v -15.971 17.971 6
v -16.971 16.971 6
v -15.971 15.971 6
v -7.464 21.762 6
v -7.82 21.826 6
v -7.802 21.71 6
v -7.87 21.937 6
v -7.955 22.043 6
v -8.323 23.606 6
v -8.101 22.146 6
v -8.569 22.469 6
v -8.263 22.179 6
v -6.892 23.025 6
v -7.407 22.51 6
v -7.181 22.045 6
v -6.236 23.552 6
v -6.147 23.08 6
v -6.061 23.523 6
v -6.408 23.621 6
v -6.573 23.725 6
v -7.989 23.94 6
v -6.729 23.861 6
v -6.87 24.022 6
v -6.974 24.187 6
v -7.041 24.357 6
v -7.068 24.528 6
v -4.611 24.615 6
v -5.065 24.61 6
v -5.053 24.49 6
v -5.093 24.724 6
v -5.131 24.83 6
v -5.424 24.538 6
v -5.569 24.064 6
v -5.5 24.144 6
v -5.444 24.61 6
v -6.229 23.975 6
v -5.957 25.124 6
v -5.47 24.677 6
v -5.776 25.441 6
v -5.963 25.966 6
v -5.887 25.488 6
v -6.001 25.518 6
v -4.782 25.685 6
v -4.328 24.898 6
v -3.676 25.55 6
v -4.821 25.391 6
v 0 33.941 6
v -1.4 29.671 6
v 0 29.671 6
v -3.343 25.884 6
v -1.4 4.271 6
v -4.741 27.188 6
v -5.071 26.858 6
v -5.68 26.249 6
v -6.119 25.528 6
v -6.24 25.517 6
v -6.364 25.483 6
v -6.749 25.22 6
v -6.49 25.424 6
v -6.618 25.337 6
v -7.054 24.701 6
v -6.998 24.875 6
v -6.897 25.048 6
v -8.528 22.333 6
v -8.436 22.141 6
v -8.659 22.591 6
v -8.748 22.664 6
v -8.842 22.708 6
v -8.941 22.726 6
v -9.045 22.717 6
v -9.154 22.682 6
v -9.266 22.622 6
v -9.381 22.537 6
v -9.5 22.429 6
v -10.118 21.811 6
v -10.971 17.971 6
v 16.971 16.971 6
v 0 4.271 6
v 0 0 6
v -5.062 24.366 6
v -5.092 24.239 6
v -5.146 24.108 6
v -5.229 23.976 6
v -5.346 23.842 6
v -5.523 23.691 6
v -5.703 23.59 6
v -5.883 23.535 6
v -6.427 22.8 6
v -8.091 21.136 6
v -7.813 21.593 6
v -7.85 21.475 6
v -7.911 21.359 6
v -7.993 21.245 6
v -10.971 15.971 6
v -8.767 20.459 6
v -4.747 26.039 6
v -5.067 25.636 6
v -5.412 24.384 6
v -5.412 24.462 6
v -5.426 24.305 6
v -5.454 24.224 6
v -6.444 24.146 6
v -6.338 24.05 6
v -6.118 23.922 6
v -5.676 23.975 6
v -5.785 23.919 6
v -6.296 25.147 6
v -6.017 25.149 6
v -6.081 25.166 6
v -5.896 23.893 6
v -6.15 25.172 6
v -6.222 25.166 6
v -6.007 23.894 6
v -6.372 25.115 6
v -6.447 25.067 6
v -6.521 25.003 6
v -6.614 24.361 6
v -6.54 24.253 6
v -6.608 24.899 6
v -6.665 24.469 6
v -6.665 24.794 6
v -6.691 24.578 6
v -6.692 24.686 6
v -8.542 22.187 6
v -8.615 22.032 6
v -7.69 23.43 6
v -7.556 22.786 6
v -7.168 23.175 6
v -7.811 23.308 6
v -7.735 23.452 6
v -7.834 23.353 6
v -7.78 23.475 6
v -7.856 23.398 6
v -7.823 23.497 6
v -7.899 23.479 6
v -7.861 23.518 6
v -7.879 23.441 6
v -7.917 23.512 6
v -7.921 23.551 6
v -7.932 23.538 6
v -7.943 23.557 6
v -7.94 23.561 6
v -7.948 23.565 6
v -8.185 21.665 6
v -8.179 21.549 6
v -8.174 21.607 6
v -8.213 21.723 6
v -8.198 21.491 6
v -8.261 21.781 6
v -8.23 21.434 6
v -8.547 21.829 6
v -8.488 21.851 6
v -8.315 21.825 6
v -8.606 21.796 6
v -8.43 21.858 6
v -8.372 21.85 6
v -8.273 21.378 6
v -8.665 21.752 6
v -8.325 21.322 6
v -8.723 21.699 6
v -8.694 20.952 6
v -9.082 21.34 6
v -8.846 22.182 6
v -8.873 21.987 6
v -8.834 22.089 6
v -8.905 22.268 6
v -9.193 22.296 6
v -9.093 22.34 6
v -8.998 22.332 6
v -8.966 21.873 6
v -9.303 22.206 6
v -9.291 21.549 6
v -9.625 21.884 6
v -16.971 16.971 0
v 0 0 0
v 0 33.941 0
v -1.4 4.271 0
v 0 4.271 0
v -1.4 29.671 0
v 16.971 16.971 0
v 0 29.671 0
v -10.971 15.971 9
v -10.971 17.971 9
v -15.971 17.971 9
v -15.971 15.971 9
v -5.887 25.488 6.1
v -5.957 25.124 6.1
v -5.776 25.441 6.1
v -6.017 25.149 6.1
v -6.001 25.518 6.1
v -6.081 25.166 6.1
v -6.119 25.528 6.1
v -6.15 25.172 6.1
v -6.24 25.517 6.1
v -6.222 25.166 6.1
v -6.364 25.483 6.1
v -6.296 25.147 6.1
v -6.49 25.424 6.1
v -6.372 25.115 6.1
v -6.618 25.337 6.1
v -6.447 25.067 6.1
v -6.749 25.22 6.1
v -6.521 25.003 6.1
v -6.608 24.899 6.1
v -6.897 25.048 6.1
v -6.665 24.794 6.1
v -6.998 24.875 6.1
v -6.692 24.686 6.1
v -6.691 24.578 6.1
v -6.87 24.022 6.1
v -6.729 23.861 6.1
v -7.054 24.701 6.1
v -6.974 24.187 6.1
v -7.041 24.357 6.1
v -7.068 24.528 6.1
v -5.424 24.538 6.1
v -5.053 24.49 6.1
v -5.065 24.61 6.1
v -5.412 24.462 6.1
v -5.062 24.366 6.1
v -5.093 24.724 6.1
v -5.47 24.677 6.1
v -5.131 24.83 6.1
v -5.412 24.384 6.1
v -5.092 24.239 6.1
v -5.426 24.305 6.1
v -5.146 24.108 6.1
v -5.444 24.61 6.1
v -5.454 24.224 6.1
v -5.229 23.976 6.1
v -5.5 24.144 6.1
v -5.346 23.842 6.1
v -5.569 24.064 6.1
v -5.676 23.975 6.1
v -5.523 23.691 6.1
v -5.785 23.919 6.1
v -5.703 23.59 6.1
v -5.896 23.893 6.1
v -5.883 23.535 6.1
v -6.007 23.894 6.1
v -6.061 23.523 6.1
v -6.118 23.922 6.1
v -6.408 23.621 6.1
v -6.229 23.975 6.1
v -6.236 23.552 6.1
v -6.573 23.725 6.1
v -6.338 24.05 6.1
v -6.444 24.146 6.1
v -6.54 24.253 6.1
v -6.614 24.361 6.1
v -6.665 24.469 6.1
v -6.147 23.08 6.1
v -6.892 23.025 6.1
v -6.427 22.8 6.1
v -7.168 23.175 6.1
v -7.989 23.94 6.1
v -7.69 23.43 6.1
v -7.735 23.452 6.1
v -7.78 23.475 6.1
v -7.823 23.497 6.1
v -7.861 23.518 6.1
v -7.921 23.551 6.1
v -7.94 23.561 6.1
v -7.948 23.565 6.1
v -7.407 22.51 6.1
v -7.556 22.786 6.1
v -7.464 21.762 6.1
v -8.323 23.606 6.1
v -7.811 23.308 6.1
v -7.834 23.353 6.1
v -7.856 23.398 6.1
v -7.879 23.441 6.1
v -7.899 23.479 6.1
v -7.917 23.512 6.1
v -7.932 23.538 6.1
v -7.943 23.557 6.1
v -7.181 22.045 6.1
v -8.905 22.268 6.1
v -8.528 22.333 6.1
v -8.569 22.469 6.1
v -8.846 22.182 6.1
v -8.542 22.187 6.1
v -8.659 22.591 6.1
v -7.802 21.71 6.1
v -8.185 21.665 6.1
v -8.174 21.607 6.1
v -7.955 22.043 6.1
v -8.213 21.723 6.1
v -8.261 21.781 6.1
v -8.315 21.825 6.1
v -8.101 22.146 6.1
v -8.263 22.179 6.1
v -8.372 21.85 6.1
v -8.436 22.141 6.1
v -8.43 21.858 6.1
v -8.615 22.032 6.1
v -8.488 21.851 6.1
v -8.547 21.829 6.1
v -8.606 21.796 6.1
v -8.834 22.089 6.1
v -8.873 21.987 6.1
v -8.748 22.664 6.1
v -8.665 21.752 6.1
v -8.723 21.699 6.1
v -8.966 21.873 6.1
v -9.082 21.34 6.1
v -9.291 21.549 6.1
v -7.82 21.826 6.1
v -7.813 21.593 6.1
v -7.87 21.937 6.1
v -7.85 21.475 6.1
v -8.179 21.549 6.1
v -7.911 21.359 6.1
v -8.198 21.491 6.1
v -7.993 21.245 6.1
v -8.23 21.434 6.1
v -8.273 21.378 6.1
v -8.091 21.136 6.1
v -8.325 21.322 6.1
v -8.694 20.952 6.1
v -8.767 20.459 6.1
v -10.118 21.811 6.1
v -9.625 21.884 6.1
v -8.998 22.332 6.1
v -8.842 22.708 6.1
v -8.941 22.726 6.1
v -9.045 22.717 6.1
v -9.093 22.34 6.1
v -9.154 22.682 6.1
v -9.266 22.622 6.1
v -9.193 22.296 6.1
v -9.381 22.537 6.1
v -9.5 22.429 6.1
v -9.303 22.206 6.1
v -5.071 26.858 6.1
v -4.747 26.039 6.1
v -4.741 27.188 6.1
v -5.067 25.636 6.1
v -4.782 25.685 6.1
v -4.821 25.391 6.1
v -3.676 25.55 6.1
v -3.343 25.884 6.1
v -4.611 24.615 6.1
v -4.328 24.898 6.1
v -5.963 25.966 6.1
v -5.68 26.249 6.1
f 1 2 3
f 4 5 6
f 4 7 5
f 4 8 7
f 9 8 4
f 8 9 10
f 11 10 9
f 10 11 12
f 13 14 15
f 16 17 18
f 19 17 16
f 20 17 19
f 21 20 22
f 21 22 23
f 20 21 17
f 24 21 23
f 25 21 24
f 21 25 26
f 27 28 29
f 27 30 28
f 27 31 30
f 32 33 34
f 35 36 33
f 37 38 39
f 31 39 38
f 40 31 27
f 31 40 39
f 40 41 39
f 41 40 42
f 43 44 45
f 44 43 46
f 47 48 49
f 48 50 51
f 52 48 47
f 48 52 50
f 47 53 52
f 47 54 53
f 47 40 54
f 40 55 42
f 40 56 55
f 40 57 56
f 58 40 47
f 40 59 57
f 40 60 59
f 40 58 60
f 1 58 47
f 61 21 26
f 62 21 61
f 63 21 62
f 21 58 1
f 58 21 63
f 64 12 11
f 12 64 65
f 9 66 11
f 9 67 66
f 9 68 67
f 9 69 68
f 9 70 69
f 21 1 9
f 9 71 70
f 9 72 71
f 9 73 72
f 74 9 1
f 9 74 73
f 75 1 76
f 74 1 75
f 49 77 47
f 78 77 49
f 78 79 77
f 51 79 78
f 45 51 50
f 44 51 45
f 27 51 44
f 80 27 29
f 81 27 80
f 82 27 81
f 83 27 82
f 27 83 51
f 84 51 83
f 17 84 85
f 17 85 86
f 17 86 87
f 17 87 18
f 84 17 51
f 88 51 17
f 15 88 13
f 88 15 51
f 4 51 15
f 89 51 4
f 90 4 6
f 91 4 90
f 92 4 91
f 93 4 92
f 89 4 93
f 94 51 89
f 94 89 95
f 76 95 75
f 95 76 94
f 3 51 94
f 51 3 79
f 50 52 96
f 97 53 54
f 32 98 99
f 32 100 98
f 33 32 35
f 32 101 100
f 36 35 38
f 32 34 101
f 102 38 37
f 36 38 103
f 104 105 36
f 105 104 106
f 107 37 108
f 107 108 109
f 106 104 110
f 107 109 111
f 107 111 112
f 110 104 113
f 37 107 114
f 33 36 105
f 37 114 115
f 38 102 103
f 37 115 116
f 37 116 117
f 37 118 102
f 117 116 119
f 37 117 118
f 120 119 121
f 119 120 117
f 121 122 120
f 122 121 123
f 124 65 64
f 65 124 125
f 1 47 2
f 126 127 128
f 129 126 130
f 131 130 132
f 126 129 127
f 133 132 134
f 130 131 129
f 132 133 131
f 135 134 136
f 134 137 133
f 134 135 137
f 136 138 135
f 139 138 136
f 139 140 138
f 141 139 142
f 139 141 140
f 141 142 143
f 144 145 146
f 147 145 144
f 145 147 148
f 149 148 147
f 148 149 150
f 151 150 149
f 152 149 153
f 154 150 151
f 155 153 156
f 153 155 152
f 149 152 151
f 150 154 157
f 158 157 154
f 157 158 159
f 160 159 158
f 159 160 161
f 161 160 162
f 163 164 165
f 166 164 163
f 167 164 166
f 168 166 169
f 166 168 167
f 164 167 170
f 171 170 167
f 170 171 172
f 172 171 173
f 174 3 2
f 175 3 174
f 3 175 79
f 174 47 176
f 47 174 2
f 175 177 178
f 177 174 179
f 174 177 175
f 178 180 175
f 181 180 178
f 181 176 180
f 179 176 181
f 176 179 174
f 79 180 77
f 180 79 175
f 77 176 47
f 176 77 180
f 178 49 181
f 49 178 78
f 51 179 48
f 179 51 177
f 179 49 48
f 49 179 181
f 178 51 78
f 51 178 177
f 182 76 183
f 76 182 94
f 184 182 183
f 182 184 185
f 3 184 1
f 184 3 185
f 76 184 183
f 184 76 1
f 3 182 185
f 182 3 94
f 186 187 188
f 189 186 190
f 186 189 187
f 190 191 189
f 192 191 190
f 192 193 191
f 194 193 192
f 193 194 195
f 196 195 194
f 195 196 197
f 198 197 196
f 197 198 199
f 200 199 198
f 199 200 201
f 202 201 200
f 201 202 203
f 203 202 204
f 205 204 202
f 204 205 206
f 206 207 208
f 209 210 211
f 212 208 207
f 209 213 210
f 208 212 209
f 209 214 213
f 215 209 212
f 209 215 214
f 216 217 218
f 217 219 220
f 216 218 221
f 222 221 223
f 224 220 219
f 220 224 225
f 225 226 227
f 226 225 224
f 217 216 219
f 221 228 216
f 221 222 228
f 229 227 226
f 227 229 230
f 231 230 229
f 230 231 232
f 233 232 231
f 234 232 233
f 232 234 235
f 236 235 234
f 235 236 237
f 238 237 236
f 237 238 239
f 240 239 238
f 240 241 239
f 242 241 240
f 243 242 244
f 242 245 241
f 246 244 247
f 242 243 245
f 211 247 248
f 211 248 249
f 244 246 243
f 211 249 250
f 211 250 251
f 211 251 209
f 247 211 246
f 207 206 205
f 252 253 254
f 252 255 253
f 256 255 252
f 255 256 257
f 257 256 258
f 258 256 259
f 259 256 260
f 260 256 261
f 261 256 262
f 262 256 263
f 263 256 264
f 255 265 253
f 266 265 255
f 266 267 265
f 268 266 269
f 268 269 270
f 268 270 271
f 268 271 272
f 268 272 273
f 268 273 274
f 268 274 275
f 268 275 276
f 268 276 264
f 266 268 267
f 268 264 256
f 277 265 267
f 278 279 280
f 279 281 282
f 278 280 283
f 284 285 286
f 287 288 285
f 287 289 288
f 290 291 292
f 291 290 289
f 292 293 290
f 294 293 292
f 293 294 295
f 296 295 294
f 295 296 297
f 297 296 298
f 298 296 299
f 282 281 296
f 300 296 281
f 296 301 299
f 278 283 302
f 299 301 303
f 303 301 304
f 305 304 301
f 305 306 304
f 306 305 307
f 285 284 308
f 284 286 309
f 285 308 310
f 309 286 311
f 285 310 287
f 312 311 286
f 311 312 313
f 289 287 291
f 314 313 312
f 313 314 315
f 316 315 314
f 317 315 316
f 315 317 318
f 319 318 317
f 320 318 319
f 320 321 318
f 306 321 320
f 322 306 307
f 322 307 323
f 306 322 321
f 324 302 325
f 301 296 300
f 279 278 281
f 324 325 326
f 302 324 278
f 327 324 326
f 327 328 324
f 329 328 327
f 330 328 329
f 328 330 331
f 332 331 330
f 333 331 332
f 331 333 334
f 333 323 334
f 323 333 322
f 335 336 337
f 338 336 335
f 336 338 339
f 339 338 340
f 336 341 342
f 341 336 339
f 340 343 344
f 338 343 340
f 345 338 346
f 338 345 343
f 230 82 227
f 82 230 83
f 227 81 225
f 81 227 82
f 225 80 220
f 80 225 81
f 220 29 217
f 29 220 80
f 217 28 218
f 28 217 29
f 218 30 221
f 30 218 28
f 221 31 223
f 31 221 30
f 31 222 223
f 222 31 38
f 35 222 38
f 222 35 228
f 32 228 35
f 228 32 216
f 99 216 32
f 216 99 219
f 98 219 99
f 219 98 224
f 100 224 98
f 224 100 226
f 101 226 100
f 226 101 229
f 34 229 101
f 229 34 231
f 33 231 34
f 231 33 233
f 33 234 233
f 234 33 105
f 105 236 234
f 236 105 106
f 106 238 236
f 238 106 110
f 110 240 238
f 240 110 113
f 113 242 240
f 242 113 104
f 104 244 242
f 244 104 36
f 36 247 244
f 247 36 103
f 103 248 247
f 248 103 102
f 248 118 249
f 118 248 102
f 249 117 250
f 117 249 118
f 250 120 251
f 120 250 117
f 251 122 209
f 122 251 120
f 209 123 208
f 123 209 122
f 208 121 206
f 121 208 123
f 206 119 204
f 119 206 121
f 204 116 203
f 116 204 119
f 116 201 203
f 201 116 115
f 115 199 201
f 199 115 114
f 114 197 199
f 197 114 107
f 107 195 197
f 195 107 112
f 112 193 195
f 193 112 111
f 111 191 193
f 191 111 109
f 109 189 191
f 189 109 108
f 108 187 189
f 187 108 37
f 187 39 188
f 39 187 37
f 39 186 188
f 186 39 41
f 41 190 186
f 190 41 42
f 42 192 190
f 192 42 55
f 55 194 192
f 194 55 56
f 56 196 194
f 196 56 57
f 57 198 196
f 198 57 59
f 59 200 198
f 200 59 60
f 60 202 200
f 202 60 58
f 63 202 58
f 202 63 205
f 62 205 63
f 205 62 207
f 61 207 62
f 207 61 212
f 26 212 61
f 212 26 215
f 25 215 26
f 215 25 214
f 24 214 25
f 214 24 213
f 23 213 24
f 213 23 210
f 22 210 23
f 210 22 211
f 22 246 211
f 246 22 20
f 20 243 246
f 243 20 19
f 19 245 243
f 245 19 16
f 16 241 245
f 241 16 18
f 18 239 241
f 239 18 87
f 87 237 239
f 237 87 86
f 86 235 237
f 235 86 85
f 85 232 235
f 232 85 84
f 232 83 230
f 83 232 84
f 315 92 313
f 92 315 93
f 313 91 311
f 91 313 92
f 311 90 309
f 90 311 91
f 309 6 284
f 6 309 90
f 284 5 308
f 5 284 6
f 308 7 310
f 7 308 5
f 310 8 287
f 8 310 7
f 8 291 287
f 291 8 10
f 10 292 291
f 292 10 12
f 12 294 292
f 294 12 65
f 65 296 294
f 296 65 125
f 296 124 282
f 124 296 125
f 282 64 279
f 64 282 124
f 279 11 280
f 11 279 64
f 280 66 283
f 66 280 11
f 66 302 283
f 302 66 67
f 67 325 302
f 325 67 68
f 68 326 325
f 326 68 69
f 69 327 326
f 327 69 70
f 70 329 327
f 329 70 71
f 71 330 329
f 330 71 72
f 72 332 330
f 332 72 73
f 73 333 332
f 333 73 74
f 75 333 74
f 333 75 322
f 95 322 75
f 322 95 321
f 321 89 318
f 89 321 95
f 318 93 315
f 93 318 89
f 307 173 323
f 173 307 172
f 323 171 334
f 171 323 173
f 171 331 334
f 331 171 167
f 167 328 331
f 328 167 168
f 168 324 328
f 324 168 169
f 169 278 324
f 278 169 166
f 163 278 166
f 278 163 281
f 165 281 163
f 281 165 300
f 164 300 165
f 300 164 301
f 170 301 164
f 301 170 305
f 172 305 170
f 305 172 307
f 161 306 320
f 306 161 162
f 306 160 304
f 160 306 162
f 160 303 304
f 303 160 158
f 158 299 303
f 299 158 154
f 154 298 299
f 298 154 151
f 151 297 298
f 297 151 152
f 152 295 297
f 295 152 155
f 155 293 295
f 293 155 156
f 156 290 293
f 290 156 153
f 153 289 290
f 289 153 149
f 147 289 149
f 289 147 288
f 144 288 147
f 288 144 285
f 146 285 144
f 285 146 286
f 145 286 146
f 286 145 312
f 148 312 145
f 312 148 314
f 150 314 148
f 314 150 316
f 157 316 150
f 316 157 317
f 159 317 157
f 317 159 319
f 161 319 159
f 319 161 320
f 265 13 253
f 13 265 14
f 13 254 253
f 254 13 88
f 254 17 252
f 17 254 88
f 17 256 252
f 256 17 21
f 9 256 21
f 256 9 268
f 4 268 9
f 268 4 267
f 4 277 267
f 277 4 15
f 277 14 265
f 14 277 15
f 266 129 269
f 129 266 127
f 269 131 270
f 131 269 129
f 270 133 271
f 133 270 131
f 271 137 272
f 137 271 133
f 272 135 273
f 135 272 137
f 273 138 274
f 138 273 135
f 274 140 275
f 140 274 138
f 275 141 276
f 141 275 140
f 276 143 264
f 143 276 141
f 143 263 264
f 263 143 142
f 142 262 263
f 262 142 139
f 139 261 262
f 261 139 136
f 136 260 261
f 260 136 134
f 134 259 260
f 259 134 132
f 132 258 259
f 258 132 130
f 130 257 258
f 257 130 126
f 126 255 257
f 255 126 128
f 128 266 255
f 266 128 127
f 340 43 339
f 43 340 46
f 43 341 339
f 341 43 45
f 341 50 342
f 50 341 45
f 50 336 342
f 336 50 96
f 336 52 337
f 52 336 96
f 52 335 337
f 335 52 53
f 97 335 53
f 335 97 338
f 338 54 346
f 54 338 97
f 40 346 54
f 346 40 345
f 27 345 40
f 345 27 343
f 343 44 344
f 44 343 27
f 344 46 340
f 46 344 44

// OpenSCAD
// Microscope slide holder for RF-6000 Spectrofluorophotometer

// Units are mm
// Parameters
slide_depth = 1; // Thickness of slide
stage_bottom = 12.5; // location of start of cut, 
//slide_bottom = 8.5; // where slide will rest
slide_width = 25; // in this case, it will be the height, slides are about 25 mm wide, but larger will allow the slide to move around

post_width = 24; // square base
post_height = 6;

tol = 0.2; // tolerance for gaps to allow slide to pass

// Derived parameters
hypotenuse = ((2*(post_width^2))^(0.5));
union() {
    difference() {
        // Mounting Post
        translate([0, 0, 0])
        rotate([0,0,45])
        cube([post_width, post_width, post_height]);
        
        // Slide cutout
        translate([-(slide_depth+(2*tol)), (hypotenuse-slide_width-(2*tol))/2, -1])
        cube([slide_depth+(2*tol), slide_width+(2*tol), 2+post_height]);
    };
    
    // Removal post
    translate([-hypotenuse/2+1, (hypotenuse/2)-1, post_height-1])
    cube([5, 2, 4]);
    
    // Label back
    rotate([0, 0, 45])
    translate([0.5*post_width, 0.9*post_width, post_height])
    linear_extrude(height = 0.1)
    text("BACK", size = 2, font = "Arial:style=Bold", halign = "center", valign = "center");
}
